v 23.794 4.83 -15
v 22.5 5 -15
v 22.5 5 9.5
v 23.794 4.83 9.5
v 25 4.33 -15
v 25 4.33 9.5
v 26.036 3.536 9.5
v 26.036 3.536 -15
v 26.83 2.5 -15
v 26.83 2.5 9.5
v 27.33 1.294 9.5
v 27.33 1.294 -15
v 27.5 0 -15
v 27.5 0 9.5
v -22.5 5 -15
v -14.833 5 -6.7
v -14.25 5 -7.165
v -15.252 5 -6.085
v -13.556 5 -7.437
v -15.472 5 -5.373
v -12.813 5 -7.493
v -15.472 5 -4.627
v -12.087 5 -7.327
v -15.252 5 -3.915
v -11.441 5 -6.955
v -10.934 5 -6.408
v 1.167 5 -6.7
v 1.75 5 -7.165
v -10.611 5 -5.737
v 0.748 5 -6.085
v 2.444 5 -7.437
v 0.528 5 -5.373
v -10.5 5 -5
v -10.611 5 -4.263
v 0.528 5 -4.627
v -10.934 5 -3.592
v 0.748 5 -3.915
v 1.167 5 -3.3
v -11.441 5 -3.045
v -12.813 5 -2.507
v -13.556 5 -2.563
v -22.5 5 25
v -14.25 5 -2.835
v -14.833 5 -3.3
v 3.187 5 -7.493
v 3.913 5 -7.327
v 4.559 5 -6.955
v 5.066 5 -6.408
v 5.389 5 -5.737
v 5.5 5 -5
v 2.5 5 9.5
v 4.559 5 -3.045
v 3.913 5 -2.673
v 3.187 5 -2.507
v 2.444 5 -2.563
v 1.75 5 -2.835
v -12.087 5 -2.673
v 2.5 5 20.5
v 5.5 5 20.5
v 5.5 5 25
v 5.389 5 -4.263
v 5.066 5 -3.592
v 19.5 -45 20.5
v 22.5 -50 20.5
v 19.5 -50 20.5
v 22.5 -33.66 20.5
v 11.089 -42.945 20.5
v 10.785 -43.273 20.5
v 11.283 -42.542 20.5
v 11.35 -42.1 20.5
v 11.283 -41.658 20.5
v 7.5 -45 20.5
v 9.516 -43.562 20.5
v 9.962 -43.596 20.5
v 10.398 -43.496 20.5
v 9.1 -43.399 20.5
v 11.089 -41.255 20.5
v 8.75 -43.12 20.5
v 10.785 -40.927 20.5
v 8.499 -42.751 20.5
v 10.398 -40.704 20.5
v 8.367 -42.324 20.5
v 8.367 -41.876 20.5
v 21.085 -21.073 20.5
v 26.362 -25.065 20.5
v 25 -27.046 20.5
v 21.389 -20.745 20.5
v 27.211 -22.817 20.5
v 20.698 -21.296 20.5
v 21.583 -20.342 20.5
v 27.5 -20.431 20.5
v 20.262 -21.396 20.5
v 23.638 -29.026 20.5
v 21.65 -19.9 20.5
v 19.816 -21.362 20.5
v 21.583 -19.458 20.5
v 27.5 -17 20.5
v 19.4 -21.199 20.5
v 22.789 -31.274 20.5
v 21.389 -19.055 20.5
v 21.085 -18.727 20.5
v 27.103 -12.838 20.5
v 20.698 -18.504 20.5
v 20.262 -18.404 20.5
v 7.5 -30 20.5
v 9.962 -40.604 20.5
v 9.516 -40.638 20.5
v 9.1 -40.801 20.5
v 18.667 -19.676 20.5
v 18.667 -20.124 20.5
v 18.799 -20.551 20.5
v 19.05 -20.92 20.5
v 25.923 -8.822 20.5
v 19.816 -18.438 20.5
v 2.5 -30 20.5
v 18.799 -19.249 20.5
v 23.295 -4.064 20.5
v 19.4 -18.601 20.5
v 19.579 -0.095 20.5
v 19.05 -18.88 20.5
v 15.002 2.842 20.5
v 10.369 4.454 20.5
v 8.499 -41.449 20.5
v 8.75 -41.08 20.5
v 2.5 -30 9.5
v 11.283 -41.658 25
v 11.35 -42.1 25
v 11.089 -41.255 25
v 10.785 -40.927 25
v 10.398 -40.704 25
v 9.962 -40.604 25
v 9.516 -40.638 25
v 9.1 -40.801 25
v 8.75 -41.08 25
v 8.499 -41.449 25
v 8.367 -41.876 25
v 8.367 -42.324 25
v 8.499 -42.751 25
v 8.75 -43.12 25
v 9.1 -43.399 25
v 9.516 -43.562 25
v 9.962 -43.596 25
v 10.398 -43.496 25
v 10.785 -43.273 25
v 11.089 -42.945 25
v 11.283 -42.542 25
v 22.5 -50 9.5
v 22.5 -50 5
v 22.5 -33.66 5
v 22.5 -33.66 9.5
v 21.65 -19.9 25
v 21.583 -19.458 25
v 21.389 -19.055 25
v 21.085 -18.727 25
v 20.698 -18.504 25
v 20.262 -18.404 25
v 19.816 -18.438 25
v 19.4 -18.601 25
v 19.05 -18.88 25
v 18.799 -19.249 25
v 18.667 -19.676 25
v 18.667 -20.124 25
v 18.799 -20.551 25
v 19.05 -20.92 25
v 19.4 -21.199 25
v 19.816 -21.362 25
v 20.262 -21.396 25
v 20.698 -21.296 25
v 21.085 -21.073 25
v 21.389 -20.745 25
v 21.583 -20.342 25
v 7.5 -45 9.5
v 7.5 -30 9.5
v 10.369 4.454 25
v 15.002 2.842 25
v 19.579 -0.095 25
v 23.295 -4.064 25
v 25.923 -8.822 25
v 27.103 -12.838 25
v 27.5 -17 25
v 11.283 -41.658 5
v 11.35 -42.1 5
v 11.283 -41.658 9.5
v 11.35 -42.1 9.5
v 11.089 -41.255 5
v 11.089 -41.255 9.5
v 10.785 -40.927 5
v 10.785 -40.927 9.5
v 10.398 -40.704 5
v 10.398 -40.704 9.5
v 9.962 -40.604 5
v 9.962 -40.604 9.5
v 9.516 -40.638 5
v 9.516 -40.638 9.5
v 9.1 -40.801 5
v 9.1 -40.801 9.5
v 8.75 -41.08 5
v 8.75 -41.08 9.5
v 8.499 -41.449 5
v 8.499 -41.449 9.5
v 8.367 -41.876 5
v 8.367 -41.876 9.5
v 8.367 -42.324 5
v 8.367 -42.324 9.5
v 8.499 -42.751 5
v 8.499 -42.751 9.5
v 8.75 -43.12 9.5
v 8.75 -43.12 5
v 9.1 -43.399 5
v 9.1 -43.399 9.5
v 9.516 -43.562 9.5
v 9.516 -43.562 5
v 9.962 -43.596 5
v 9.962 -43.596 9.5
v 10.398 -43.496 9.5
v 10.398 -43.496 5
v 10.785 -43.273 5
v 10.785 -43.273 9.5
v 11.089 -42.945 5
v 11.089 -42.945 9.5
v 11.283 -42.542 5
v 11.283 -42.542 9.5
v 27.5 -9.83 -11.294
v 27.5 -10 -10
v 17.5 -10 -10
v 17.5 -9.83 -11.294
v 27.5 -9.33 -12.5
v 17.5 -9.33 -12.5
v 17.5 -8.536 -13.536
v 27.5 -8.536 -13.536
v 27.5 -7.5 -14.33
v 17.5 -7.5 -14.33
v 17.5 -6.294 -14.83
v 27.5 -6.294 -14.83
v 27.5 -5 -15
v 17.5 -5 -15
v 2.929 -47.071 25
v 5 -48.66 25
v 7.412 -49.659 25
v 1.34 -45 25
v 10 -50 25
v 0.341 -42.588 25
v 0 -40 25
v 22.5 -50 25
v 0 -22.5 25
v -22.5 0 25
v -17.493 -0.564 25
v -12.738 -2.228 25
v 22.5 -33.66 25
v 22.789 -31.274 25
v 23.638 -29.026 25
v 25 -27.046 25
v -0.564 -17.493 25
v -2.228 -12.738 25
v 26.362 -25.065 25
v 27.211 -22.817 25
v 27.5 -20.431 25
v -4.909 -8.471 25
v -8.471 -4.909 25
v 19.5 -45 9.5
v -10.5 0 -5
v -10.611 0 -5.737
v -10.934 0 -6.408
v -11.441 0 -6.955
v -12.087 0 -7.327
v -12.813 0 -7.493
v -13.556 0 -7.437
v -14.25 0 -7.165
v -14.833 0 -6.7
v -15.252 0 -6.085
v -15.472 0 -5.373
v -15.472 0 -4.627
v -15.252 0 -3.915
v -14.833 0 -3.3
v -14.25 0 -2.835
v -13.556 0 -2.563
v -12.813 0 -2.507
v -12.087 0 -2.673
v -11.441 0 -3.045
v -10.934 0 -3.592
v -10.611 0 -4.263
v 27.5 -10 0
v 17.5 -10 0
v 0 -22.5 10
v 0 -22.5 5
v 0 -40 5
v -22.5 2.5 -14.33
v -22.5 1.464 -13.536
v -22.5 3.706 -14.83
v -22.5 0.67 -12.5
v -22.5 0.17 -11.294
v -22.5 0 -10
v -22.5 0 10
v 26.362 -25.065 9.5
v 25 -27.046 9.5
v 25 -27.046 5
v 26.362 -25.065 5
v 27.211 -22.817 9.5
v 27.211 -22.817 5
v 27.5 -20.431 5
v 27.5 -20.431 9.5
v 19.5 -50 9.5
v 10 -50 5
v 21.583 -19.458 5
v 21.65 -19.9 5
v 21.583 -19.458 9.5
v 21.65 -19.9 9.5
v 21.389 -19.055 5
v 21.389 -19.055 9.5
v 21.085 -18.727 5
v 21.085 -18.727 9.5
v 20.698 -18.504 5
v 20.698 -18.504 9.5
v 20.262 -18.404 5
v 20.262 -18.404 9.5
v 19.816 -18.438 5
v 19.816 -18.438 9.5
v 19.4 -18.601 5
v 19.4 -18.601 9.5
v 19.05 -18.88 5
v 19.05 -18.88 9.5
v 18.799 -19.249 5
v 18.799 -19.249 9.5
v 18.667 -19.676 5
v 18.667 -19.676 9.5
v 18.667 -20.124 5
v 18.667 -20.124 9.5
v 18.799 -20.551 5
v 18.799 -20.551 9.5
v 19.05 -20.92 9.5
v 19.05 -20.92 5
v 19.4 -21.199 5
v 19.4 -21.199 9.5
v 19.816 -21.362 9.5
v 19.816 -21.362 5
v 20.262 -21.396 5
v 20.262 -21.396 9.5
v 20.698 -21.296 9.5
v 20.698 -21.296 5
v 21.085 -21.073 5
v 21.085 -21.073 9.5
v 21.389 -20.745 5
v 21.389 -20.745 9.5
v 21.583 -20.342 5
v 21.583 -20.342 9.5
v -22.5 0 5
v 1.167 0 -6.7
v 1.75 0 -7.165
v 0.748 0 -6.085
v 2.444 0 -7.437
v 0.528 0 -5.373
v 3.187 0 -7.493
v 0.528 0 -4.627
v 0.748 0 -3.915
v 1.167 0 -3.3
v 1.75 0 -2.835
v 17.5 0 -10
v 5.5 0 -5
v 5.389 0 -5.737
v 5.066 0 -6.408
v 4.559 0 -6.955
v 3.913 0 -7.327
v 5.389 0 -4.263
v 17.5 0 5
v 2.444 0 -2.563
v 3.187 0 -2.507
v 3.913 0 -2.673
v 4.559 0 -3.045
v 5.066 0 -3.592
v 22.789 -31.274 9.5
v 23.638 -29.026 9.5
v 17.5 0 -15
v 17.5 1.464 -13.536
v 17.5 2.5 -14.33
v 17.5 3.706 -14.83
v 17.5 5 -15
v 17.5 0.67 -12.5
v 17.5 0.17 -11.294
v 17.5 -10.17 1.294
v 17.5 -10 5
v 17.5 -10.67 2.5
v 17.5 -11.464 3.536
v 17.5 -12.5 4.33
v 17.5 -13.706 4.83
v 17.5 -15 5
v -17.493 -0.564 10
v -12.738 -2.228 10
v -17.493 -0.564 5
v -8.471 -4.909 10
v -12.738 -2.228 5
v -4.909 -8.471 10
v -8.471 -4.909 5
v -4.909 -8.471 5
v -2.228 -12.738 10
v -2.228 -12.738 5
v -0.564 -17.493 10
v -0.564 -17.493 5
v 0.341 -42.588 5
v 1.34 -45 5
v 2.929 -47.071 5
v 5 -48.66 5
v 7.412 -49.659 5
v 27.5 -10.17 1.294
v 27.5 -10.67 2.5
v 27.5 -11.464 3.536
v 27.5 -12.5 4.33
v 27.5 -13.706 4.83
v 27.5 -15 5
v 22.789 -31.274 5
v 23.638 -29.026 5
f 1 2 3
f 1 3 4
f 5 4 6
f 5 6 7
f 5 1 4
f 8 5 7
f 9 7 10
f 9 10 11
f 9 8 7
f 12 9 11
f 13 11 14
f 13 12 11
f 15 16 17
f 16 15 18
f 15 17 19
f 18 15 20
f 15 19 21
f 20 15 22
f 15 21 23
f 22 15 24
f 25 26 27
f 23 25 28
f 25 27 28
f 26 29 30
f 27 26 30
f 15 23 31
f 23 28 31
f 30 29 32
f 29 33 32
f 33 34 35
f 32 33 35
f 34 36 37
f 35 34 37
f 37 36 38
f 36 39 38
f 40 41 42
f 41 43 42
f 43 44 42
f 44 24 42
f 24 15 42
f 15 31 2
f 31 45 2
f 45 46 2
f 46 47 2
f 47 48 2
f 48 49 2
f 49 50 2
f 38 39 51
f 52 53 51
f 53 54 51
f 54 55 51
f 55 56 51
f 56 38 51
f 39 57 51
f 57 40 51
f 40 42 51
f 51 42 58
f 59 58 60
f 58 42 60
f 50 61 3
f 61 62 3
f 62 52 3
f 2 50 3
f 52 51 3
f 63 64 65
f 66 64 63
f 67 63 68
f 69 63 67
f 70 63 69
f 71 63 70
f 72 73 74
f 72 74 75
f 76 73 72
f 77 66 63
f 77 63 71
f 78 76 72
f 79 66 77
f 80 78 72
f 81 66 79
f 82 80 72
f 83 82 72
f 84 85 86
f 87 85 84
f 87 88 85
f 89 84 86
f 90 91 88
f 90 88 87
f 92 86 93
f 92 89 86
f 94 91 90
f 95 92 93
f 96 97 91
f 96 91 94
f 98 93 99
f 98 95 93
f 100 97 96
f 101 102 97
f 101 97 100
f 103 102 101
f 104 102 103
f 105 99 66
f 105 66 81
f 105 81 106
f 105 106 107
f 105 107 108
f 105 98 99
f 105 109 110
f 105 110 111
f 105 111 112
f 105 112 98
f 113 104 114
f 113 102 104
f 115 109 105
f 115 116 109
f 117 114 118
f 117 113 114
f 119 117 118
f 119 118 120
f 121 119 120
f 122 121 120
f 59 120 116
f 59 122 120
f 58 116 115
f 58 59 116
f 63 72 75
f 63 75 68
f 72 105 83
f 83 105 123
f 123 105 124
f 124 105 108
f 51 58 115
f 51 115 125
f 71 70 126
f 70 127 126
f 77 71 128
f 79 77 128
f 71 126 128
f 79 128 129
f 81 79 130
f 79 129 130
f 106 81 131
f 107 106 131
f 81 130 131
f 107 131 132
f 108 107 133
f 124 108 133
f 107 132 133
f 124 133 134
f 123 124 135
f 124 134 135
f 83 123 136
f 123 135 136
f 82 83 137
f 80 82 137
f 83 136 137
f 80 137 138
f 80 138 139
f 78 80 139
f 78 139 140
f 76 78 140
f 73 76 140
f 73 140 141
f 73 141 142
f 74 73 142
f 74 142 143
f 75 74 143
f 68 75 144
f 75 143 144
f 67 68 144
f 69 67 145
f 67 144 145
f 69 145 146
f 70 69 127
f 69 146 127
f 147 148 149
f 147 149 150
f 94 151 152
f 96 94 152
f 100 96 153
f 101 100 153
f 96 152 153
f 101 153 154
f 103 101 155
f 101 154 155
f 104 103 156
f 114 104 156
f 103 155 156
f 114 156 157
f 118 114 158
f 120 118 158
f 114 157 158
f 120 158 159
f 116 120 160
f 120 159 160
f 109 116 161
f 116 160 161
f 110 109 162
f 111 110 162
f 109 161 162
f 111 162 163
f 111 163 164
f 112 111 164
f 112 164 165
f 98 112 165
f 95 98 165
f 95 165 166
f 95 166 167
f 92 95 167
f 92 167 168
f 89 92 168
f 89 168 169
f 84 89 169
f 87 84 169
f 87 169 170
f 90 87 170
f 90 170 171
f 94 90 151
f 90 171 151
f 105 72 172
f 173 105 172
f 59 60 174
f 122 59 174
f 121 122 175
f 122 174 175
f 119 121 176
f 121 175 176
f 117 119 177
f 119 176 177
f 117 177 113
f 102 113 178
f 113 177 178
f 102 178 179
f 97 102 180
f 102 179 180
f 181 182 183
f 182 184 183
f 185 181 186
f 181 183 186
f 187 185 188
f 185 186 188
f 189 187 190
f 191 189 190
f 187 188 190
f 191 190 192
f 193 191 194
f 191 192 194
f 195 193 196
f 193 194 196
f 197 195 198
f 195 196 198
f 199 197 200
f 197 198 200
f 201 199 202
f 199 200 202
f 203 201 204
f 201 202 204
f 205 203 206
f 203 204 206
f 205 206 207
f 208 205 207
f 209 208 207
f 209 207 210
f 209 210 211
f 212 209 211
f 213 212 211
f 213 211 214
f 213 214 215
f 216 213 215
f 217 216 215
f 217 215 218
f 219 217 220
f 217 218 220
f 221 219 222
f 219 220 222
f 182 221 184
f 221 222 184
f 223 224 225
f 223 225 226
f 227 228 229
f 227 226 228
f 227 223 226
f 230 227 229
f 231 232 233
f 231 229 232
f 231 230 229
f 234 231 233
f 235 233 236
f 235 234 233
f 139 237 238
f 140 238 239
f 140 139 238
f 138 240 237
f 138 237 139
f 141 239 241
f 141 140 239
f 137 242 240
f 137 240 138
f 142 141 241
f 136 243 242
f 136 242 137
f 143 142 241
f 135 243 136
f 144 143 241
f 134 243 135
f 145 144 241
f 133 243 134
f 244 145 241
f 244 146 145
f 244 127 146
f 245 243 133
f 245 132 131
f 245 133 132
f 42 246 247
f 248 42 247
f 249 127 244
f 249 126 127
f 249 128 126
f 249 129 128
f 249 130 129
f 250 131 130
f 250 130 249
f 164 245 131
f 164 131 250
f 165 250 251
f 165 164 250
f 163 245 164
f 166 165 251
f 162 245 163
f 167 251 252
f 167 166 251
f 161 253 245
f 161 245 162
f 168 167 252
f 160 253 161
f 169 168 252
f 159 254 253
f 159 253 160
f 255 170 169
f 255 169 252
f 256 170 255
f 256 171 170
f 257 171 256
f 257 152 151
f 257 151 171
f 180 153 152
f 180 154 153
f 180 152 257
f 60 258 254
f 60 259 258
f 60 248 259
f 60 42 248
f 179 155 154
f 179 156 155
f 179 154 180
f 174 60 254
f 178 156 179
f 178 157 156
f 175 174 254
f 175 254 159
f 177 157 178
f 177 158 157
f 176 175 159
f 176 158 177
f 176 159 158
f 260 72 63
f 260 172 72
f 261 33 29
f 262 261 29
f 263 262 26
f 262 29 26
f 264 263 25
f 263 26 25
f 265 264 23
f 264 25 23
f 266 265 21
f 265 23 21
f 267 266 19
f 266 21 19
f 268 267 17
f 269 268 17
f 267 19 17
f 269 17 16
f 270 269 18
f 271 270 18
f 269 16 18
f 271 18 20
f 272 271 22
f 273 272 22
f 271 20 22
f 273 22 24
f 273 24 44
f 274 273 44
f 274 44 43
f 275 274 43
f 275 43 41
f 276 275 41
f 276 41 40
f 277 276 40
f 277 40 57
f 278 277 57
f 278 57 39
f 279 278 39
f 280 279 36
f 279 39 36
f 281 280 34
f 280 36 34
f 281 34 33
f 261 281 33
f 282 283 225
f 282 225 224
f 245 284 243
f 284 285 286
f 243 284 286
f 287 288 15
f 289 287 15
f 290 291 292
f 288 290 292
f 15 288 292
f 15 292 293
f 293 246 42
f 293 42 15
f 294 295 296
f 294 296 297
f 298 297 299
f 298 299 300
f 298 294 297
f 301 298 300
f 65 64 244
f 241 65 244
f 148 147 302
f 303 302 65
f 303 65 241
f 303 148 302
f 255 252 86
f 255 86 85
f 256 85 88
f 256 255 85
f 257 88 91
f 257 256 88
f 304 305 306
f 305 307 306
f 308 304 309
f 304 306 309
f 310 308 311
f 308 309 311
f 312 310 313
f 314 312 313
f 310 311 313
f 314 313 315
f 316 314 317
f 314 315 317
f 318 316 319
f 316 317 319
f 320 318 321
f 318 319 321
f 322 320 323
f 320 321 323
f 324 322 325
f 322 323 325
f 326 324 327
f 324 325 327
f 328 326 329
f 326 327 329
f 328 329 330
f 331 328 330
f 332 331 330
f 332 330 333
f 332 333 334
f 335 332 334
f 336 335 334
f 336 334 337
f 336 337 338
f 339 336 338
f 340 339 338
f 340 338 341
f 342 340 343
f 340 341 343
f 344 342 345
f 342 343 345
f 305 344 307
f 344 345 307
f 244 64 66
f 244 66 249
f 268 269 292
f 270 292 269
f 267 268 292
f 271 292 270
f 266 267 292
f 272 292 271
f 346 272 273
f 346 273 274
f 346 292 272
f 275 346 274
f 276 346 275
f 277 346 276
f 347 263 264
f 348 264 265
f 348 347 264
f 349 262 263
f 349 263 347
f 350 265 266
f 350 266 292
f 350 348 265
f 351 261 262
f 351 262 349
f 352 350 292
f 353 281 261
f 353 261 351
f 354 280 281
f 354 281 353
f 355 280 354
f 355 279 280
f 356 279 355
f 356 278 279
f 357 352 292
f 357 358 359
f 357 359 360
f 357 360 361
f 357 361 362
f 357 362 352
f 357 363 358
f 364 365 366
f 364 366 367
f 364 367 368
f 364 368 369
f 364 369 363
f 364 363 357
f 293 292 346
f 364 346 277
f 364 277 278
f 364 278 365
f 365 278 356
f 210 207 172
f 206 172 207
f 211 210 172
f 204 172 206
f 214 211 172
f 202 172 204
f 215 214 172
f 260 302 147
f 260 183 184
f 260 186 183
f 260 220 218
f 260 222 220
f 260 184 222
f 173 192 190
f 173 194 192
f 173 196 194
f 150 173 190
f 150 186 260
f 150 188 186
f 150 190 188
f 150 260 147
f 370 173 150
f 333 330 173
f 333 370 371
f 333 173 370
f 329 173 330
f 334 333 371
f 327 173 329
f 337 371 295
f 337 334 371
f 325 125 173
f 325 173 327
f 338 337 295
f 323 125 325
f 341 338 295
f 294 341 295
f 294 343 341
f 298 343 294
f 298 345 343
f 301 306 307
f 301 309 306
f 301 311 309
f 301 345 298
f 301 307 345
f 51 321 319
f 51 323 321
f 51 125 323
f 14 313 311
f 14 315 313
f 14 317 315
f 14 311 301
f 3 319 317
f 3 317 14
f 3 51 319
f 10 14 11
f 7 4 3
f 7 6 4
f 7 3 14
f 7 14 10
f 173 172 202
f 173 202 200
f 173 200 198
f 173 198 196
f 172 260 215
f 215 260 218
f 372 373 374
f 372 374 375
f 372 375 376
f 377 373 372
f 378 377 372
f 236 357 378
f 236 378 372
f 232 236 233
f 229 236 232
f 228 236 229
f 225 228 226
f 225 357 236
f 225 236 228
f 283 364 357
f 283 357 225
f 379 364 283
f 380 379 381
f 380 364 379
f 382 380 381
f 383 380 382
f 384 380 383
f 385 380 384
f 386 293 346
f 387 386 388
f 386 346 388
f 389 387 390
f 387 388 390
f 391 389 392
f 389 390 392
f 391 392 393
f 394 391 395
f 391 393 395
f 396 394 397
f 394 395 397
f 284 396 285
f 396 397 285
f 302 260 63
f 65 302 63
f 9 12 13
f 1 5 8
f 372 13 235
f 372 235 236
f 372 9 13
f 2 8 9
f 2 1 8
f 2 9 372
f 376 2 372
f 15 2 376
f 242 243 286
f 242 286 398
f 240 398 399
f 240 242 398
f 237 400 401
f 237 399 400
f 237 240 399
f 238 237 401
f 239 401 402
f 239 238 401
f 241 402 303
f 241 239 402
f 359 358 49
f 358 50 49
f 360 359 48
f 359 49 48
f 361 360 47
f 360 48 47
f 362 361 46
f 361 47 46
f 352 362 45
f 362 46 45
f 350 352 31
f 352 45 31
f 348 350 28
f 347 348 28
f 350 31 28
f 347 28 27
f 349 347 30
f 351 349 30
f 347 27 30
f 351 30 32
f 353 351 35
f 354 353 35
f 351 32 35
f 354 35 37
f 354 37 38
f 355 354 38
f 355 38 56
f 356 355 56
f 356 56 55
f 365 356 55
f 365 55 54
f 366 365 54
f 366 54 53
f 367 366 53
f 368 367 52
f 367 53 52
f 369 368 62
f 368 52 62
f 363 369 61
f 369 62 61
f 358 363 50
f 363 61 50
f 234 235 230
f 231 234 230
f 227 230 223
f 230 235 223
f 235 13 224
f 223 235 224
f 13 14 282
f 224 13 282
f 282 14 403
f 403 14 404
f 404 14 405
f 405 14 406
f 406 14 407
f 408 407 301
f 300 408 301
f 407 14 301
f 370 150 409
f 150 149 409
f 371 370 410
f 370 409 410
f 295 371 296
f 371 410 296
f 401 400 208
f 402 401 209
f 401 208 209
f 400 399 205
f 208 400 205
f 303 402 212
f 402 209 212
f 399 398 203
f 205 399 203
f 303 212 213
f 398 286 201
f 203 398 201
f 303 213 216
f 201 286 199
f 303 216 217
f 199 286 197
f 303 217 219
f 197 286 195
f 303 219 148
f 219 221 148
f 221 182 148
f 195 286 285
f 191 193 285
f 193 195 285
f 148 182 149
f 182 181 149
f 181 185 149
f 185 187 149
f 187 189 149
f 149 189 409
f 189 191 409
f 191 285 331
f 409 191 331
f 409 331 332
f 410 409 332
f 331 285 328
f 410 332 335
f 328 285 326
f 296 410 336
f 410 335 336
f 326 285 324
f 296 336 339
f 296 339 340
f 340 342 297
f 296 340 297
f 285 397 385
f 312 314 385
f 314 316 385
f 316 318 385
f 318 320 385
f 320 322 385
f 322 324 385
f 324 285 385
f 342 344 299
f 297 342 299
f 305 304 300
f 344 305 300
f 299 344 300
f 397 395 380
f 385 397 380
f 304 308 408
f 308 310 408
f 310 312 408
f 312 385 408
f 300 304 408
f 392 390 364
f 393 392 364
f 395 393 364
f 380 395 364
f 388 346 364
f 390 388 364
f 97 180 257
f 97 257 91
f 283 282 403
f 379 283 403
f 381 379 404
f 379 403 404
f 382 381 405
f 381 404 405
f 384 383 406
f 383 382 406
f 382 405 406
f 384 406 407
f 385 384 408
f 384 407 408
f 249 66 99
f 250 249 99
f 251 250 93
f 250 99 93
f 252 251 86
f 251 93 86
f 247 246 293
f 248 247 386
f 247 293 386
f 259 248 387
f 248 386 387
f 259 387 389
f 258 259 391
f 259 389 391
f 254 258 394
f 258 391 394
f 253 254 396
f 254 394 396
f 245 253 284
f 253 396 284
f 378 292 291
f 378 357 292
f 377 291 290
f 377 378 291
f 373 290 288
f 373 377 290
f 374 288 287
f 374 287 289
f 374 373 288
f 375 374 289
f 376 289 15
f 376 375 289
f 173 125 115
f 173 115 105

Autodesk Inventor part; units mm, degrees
ref_plane "YZ Plane" through (0, 0, 0) normal (1, 0, 0) x (0, 1, 0)
ref_plane "XZ Plane" through (0, 0, 0) normal (0, 1, 0) x (-1, 0, 0)
ref_plane "XY Plane" through (0, 0, 0) normal (0, 0, 1) x (1, 0, 0)
sketch "Sketch1" plane through (0, 0, 0) normal (0, 1, 0) x (-1, 0, 0)
  line L0 (22.5, 10) -> (-22.5, 10)
  line L1 (-22.5, 10) -> (-22.5, -10)
  line L2 (-22.5, -10) -> (22.5, -10)
  line L3 (22.5, -10) -> (22.5, 10)
  line L4 (22.5, 10) -> (-22.5, -10) construction
  line L5 (-22.5, 10) -> (22.5, -10) construction
  point P0 (0, 0)
  dimension "d0" = 45
  dimension "d1" = 20
extrude "Extrusion1" add sketch "Sketch1" along normal blind 5
sketch "Sketch2" plane through (0, 0, 0) normal (0, -1, 0) x (1, 0, 0)
  line L0 (22.5, 10) -> (22.5, -10) projected
  line L1 (22.5, 10) -> (0, 10)
  line L2 (0, 10) -> (0, 5)
  line L3 (0, 5) -> (22.5, 5)
  line L4 (22.5, 5) -> (22.5, 10)
  point P0 (0, 0)
  dimension "d4" = 22.5
  dimension "d5" = 5
extrude "Extrusion2" add sketch "Sketch2" along normal blind 50
fillet "Fillet1" radius 22.5 1 edges at (0, 0, 7.5)
sketch "Sketch3" plane through (-22.5, 5, 10) normal (0, 0, 1) x (1, 0, 0)
  arc A0 (22.5, -27.5) -> (0, -5) centre (0, -27.5) ccw projected
  line L0 (22.5, -27.5) -> (22.5, -55) projected
  line L1 (45, -55) -> (22.5, -55) projected
  line L2 (45, 0) -> (45, -55) projected
  line L3 (0, 0) -> (45, 0) projected
  line L4 (0, -5) -> (0, 0) projected
  point P0 (22.5, -5)
extrude "Extrusion3" add sketch "Sketch3" along normal blind 15
sketch "Sketch7" plane through (0, 5, 0) normal (0, 1, 0) x (1, 0, 0)
  line L0 (22.5, -5) -> (-22.5, -5) projected
  line L1 (22.5, 10) -> (22.5, -25) projected
  line L2 (22.5, -5) -> (22.5, -25)
  line L3 (42.5, -20.5) -> (2.5, -20.5)
  line L4 (2.5, -20.5) -> (2.5, -9.5)
  line L5 (2.5, -9.5) -> (42.5, -9.5)
  line L6 (42.5, -9.5) -> (42.5, -20.5)
  line L7 (42.5, -20.5) -> (2.5, -9.5) construction
  line L8 (2.5, -20.5) -> (42.5, -9.5) construction
  point P0 (0, 0)
  point P1 (22.5, -15)
  dimension "d16" = 40
  dimension "d17" = 11
extrude "Extrusion5" cut sketch "Sketch7" against normal blind 50
sketch "Sketch8" plane through (0, -45, 0) normal (0, 1, 0) x (1, 0, 0)
  line L0 (22.5, -5) -> (22.5, -25) projected
  line L1 (22.5, -15) -> (7.5, -15)
  line L2 (22.5, -15) -> (37.5, -15) construction
  line L3 (2.5, -20.5) -> (12.5, -20.5)
  line L4 (12.5, -20.5) -> (12.5, -9.5)
  line L5 (12.5, -9.5) -> (2.5, -9.5)
  line L6 (2.5, -9.5) -> (2.5, -20.5)
  line L7 (2.5, -20.5) -> (12.5, -9.5) construction
  line L8 (12.5, -20.5) -> (2.5, -9.5) construction
  line L9 (7.5, -20.5) -> (7.5, -9.5)
  point P0 (0, 0)
  dimension "d20" = 15
  dimension "d21" = 180
  dimension "d22" = 10
  dimension "d23" = 11
extrude "Extrusion6" add sketch "Sketch8" along normal blind 15 contours L9 L3 L6 L5
sketch "Sketch9" plane through (0, -45, 0) normal (0, 1, 0) x (1, 0, 0)
  line L0 (7.5, -9.5) -> (22.5, -9.5) projected
  line L1 (22.5, -9.5) -> (19.5, -9.5)
  line L2 (19.5, -9.5) -> (19.5, -20.5)
  line L3 (19.5, -20.5) -> (22.5, -20.5)
  line L4 (22.5, -20.5) -> (22.5, -9.5)
  point P0 (0, 0)
  dimension "d26" = 3
  dimension "d27" = 11
extrude "Extrusion7" cut sketch "Sketch9" against normal blind 15
fillet "Fillet2" radius 10 1 edges at (0, -50, 15)
sketch "Sketch10" plane through (-22.5, 5, 25) normal (0, 0, 1) x (1, 0, 0)
  circle A0 centre (32.35, -47.1) radius 1.5 projected
  circle A1 centre (42.65, -24.9) radius 1.5 projected
  point P0 (22.5, -5)
extrude "Extrusion8" cut sketch "Sketch10" against normal blind 20
sketch "Sketch11" plane through (22.5, 0, -10) normal (1, 0, 0) x (0, 0, -1)
  line L0 (-19.5, 5) -> (-19.5, -50) projected
  line L1 (-15, -50) -> (-19.5, -50) projected
  line L2 (-15, 0) -> (-15, -50) projected
  line L3 (-15, 0) -> (0, 0) projected
  line L4 (0, 0) -> (0, 5) projected
  line L5 (0, 5) -> (-19.5, 5) projected
  line L6 (-30.5, -50) -> (-30.5, 5) projected
  line L7 (-30.5, 5) -> (-35, 5) projected
  line L8 (-35, -50) -> (-35, 5) projected
  line L9 (-30.5, -50) -> (-35, -50) projected
  point P0 (-10, 0)
extrude "Extrusion9" add sketch "Sketch11" along normal blind 5
sketch "Sketch12" plane through (0, -50, 0) normal (0, -1, 0) x (1, 0, 0)
  line L0 (10, 5) -> (27.5, 5) projected
  line L1 (27.5, 5) -> (22.5, 5)
  line L2 (22.5, 5) -> (22.5, 25)
  line L3 (22.5, 25) -> (27.5, 25)
  line L4 (27.5, 25) -> (27.5, 5)
  point P0 (0, 0)
  dimension "d35" = 5
  dimension "d36" = 20
extrude "Extrusion10" cut sketch "Sketch12" against normal blind 25
fillet "Fillet3" radius 10 4 edges at (27.5, -25, 7.25) (22.5, -25, 7.25) (27.5, -25, 22.75) (22.5, -25, 22.75)
sketch "Sketch13" plane through (0, 0, 0) normal (0, -1, 0) x (1, 0, 0)
  line L0 (27.5, -10) -> (17.5, -10)
  line L1 (17.5, -10) -> (17.5, 5)
  line L2 (17.5, 5) -> (27.5, 5)
  line L3 (27.5, 5) -> (27.5, -10)
  point P0 (0, 0)
  dimension "d40" = 10
  dimension "d41" = 15
extrude "Extrusion11" add sketch "Sketch13" along normal blind 10
sketch "Sketch14" plane through (0, 5, 0) normal (0, 1, 0) x (1, 0, 0)
  line L0 (-22.5, 10) -> (27.5, 10) projected
  line L1 (-22.5, 10) -> (-13, 10)
  line L2 (-13, 10) -> (-13, 5)
  line L3 (-13, 5) -> (3, 5)
  circle A0 centre (-13, 5) radius 2.5
  circle A1 centre (3, 5) radius 2.5
  point P0 (0, 0)
  dimension "d45" = 9.5
  dimension "d46" = 5
  dimension "d47" = 16
  dimension "d48" = 90
  dimension "d49" = 5
  dimension "d50" = 5
extrude "Extrusion12" cut sketch "Sketch14" against normal blind 10
sketch "Sketch15" plane through (-22.5, 0, -10) normal (0, 0, -1) x (-1, 0, 0)
  line L0 (0, 0) -> (-40, 0) projected
  line L1 (0, 0) -> (0, 5) projected
  line L2 (0, 5) -> (-50, 5) projected
  line L3 (-50, 5) -> (-50, -10) projected
  line L4 (-40, -10) -> (-50, -10) projected
  line L5 (-40, 0) -> (-40, -10) projected
  point P0 (-22.5, 0)
extrude "Extrusion13" add sketch "Sketch15" along normal blind 5
fillet "Fillet5" radius 5 1 edges at (-2.5, 0, -15)
fillet "Fillet6" radius 5 2 edges at (22.5, -10, 5) (22.5, -10, -15)
fillet "Fillet7" radius 22 1 edges at (27.5, 5, 22.75)
fillet "Fillet8" radius 5 1 edges at (27.5, 5, -2.75)
properties part number "SOPORTE_FDC"
